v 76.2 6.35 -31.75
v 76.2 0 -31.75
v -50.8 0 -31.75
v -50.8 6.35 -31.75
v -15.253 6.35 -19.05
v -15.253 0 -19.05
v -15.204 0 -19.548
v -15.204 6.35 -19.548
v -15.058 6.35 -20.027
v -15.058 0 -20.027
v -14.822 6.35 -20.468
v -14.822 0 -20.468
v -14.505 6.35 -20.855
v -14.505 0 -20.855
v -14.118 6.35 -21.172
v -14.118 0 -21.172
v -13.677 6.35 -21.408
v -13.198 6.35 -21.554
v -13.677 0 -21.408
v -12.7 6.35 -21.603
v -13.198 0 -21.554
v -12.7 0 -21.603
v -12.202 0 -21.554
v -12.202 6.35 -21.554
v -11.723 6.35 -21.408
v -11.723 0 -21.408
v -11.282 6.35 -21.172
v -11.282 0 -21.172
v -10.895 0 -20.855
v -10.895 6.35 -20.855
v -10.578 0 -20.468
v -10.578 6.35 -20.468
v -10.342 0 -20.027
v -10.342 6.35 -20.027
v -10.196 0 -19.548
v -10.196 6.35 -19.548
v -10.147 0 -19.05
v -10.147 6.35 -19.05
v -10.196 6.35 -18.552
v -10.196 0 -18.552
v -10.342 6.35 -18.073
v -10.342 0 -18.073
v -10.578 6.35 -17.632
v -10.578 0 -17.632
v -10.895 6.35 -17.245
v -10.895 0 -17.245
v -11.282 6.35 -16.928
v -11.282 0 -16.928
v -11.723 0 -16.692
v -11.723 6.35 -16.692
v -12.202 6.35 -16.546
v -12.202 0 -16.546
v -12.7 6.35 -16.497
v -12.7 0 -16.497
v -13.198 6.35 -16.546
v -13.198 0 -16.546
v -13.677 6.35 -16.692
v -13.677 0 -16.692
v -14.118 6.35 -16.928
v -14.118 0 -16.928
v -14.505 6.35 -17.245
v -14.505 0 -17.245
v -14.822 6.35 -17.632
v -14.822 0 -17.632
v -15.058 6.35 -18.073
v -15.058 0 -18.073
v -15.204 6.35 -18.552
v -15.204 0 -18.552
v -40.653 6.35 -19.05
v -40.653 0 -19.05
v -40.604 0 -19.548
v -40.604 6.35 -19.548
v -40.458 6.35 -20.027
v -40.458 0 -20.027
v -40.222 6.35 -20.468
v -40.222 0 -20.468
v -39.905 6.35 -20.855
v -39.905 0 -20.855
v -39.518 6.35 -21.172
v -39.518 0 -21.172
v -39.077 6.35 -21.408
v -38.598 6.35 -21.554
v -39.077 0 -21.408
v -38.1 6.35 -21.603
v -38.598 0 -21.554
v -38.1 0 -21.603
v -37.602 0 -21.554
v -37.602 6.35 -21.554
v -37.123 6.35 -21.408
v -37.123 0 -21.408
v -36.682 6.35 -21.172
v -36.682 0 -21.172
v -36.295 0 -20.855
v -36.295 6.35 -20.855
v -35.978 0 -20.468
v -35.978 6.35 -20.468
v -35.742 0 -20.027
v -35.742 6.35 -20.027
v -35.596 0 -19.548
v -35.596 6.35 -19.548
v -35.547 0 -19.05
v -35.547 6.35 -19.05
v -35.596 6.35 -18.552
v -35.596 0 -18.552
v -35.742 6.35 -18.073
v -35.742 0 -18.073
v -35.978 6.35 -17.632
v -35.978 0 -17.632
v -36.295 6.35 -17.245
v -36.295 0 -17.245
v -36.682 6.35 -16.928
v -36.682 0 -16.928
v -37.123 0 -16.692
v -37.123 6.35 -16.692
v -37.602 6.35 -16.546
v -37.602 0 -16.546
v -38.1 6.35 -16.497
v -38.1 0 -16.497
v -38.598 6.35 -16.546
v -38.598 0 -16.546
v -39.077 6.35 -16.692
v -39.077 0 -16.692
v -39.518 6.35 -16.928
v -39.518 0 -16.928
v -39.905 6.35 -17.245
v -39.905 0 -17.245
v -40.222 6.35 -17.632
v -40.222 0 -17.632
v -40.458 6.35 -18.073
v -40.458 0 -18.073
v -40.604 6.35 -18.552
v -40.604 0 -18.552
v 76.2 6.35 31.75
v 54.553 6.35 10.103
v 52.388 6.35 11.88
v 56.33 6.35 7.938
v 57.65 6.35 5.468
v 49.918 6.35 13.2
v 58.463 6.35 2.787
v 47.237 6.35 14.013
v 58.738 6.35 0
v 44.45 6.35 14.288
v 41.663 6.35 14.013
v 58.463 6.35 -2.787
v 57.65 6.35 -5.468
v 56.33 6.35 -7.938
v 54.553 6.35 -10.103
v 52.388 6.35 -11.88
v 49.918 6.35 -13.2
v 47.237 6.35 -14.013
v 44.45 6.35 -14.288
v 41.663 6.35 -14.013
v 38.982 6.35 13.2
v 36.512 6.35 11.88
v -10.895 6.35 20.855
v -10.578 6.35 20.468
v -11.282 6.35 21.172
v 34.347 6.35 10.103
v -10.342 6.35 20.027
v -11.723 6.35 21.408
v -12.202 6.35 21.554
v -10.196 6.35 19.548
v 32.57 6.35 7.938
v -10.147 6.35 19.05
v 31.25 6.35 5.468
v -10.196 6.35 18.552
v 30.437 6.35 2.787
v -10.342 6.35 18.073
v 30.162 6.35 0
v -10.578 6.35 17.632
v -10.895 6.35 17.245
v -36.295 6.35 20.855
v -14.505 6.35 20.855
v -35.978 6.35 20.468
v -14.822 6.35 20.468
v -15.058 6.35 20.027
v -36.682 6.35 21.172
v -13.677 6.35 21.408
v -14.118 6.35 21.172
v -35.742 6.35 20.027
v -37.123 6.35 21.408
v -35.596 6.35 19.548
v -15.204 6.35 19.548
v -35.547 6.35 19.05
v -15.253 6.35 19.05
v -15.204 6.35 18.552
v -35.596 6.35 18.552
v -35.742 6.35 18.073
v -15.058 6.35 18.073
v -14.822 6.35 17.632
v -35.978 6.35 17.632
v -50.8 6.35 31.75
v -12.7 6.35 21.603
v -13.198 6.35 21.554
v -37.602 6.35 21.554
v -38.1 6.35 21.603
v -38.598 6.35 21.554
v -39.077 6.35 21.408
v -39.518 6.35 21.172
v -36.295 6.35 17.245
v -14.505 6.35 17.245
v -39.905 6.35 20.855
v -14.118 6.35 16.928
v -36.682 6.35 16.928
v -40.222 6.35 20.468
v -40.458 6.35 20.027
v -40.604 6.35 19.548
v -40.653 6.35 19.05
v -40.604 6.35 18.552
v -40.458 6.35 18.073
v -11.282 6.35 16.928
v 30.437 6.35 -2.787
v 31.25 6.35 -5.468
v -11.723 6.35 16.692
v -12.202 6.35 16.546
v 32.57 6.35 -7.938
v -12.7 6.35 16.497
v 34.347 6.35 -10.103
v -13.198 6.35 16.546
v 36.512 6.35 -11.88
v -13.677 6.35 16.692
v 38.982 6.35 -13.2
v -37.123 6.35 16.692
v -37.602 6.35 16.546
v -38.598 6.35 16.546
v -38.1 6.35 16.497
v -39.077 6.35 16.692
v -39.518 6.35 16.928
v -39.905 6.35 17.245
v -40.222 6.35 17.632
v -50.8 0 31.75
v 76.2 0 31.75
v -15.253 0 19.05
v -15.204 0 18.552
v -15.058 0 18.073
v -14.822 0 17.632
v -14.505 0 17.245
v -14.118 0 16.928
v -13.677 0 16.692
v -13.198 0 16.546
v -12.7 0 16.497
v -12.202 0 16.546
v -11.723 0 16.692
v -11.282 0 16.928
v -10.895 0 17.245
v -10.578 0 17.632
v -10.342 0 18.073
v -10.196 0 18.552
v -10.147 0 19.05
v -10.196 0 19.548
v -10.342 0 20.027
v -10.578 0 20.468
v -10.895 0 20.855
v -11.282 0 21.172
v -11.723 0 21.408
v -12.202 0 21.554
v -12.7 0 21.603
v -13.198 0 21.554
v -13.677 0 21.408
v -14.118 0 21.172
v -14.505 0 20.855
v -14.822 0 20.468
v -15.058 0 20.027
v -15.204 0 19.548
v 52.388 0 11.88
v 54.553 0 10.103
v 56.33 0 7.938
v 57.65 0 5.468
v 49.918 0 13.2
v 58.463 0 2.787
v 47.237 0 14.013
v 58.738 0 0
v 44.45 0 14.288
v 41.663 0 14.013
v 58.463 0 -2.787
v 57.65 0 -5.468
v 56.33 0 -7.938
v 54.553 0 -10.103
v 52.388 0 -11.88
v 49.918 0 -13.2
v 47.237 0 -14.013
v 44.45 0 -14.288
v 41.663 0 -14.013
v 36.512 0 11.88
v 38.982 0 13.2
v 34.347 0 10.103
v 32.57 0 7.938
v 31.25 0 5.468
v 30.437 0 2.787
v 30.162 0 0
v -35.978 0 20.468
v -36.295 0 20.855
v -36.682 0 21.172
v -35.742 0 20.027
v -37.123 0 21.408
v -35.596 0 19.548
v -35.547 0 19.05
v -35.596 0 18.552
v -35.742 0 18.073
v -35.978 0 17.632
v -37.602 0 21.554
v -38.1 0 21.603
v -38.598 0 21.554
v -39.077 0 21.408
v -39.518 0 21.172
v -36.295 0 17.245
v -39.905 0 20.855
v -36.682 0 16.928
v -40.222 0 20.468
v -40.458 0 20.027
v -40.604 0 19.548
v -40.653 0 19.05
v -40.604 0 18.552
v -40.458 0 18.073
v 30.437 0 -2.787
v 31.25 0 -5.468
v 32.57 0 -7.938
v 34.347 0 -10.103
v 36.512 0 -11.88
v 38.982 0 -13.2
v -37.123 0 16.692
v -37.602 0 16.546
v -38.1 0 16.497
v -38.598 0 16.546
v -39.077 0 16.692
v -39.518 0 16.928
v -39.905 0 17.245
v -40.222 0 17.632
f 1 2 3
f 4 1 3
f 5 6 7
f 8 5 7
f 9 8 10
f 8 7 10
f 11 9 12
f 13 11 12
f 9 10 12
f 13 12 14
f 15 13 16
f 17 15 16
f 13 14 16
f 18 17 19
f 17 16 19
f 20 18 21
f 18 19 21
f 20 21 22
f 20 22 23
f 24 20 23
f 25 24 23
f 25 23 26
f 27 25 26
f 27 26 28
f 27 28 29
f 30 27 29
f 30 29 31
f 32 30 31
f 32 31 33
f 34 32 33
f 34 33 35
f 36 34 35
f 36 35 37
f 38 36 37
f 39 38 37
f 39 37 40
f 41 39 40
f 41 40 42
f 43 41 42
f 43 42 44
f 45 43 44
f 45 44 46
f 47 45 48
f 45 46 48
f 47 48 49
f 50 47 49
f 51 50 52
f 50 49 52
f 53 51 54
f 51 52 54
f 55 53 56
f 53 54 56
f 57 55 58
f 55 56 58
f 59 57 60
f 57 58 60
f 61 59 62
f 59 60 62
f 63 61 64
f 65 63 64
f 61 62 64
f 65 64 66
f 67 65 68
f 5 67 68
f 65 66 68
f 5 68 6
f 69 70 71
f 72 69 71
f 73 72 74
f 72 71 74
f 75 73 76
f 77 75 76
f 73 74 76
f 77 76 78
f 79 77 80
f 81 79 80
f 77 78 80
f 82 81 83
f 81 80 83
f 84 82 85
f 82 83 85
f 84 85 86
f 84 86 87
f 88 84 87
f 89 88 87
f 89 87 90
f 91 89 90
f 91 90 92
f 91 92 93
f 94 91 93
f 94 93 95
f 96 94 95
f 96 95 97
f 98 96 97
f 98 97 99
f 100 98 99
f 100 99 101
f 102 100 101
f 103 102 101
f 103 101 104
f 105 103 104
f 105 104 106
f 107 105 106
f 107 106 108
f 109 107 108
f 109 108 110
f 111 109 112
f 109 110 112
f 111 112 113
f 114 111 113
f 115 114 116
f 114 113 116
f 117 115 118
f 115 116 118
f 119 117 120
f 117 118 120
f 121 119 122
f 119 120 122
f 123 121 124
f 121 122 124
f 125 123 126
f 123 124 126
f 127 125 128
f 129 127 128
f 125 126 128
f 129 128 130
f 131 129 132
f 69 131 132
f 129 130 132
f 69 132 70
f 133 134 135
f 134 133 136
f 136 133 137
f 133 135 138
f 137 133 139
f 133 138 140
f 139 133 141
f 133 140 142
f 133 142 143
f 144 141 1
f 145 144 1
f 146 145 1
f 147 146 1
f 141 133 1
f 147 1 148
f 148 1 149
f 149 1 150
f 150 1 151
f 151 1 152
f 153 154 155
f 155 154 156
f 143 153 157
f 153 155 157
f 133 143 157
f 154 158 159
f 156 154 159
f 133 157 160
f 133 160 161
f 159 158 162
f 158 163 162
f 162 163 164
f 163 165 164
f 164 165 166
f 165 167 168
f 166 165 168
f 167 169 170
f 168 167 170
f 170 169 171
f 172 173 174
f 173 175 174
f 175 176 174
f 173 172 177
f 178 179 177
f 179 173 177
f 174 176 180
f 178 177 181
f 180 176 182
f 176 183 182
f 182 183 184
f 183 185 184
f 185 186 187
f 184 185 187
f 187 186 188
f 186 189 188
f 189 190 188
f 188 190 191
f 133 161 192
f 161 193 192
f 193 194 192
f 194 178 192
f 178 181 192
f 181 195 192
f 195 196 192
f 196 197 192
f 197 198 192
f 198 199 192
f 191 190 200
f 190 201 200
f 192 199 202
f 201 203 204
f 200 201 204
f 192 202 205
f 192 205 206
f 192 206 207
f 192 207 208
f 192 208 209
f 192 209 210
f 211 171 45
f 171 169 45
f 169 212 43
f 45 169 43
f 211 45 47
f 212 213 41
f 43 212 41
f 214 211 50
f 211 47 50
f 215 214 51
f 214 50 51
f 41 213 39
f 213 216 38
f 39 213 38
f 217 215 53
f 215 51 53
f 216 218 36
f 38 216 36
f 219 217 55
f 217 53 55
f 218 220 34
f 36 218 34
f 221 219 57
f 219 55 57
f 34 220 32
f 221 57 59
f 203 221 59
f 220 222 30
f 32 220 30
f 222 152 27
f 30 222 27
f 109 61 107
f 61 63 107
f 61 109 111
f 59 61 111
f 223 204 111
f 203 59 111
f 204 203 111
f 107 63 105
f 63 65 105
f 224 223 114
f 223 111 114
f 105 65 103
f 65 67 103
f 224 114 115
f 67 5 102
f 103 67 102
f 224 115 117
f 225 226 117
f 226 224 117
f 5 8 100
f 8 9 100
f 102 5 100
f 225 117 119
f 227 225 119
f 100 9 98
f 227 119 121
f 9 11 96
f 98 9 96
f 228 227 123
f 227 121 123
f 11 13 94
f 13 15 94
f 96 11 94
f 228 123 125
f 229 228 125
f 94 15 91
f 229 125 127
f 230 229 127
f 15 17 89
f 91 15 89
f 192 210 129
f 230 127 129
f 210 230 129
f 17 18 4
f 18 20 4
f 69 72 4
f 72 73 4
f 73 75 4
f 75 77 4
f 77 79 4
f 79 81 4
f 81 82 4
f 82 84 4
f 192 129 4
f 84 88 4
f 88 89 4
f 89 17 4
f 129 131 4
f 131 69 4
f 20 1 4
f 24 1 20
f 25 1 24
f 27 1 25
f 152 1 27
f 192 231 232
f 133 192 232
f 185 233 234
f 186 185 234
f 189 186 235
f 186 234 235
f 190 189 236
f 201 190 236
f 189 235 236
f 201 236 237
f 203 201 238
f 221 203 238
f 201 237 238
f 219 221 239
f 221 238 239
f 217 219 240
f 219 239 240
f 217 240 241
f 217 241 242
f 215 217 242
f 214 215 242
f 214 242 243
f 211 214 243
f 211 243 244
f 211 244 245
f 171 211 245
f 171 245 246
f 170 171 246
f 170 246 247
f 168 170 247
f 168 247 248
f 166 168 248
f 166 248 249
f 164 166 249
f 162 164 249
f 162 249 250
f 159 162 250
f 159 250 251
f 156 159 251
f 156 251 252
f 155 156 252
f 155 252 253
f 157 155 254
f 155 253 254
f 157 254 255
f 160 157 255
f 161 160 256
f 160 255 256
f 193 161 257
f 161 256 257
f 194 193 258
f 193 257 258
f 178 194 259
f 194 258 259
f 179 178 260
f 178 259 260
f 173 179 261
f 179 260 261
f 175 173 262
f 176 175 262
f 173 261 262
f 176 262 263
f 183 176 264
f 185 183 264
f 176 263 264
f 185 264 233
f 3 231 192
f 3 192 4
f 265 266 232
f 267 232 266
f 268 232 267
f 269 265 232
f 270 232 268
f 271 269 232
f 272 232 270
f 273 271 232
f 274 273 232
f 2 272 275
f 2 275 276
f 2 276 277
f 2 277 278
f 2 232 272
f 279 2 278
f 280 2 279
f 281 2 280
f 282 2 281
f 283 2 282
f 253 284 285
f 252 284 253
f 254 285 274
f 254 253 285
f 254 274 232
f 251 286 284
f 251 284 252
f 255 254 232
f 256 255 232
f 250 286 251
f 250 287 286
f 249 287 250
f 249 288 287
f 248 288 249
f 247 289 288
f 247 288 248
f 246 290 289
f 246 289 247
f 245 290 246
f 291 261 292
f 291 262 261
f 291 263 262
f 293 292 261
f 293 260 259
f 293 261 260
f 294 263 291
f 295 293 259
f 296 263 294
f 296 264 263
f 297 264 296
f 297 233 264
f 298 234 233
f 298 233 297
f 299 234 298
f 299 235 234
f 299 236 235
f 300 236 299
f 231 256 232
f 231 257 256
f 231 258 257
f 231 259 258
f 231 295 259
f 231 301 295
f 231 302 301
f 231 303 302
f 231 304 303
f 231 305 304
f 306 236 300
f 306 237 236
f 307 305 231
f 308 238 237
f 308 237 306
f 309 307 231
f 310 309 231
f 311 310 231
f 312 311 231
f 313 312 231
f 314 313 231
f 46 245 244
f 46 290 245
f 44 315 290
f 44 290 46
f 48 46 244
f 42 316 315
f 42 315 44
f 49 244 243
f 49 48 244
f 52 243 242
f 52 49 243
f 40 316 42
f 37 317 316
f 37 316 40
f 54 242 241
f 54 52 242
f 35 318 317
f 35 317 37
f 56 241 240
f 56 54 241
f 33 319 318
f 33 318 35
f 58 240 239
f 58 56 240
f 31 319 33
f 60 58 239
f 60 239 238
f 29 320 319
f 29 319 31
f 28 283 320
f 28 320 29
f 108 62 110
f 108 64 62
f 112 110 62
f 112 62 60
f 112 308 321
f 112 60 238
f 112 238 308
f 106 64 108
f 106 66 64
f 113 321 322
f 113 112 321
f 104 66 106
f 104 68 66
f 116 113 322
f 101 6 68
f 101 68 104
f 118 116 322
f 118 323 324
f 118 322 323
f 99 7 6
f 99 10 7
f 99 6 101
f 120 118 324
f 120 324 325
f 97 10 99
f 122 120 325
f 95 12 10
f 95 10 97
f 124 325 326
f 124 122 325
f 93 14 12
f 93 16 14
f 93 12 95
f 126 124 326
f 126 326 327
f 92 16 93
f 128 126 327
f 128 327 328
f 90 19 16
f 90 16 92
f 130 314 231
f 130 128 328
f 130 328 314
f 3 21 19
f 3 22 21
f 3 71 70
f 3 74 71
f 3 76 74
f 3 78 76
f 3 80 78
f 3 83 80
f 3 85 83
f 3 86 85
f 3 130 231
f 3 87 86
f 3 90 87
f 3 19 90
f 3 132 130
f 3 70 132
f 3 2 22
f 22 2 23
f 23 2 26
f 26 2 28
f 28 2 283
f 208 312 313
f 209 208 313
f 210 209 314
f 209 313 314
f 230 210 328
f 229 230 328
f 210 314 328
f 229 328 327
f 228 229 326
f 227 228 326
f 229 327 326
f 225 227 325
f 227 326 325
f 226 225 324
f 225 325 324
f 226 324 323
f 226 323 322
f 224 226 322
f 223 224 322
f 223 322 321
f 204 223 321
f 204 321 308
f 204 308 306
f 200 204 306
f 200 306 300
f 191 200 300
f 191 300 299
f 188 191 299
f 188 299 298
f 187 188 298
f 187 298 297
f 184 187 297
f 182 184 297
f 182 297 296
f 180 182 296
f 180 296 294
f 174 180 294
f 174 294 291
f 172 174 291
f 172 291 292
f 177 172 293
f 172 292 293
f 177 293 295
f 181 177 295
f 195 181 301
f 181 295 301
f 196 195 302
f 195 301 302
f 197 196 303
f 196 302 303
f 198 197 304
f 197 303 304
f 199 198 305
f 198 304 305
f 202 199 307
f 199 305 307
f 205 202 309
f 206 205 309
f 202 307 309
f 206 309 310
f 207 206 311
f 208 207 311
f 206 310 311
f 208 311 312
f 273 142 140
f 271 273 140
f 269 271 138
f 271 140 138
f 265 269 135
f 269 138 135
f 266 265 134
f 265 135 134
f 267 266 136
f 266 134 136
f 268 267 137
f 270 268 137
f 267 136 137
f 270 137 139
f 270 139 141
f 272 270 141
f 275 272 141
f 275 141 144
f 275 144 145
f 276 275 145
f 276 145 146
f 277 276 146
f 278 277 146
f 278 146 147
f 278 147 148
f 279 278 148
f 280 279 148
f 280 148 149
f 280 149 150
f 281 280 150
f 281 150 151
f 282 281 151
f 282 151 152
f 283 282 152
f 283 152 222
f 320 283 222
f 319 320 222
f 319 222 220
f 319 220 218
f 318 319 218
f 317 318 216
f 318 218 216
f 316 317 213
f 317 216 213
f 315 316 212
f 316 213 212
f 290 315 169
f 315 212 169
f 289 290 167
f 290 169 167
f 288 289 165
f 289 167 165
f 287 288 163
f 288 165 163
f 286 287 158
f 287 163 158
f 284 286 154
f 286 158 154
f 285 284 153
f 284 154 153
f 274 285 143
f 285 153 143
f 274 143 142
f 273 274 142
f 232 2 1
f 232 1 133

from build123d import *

# Parameters (mm, degrees)
BOSS_EXTRUDE1_DEPTH    = 6.35
F_10_CLEARANCE_HOLE1_D = 5.1054
SKETCH5_R              = 14.2875
CUT_EXTRUDE1_DEPTH     = 83.793870546


with BuildPart() as part:
    # Sketch1 → Boss-Extrude1 (new body)
    with BuildSketch(Plane(origin=(0, 0, 0), x_dir=(1, 0, 0), z_dir=(0, 1, 0))):
        Polygon((50.8, 31.75), (76.2, 31.75), (76.2, -31.75), (50.8, -31.75), (-50.8, -31.75), (-50.8, 31.75), align=None)
    extrude(amount=BOSS_EXTRUDE1_DEPTH)

    # #10 Clearance Hole1 (through all)
    with Locations(Plane(origin=(0, 6.35, 0), x_dir=(1, 0, 0), z_dir=(0, 1, 0))):
        with Locations((-38.1, 19.05), (-12.7, 19.05), (-12.7, -19.05), (-38.1, -19.05)):
            Hole(F_10_CLEARANCE_HOLE1_D / 2)

    # Sketch5 → Cut-Extrude1 (cut, through all)
    with BuildSketch(Plane(origin=(0, 6.35, 0), x_dir=(1, 0, 0), z_dir=(0, 1, 0))):
        with Locations(Location((44.45, 0, 0), (0, 0, 270))):
            Circle(SKETCH5_R)
    extrude(amount=-CUT_EXTRUDE1_DEPTH, mode=Mode.SUBTRACT)


solid = part.part
